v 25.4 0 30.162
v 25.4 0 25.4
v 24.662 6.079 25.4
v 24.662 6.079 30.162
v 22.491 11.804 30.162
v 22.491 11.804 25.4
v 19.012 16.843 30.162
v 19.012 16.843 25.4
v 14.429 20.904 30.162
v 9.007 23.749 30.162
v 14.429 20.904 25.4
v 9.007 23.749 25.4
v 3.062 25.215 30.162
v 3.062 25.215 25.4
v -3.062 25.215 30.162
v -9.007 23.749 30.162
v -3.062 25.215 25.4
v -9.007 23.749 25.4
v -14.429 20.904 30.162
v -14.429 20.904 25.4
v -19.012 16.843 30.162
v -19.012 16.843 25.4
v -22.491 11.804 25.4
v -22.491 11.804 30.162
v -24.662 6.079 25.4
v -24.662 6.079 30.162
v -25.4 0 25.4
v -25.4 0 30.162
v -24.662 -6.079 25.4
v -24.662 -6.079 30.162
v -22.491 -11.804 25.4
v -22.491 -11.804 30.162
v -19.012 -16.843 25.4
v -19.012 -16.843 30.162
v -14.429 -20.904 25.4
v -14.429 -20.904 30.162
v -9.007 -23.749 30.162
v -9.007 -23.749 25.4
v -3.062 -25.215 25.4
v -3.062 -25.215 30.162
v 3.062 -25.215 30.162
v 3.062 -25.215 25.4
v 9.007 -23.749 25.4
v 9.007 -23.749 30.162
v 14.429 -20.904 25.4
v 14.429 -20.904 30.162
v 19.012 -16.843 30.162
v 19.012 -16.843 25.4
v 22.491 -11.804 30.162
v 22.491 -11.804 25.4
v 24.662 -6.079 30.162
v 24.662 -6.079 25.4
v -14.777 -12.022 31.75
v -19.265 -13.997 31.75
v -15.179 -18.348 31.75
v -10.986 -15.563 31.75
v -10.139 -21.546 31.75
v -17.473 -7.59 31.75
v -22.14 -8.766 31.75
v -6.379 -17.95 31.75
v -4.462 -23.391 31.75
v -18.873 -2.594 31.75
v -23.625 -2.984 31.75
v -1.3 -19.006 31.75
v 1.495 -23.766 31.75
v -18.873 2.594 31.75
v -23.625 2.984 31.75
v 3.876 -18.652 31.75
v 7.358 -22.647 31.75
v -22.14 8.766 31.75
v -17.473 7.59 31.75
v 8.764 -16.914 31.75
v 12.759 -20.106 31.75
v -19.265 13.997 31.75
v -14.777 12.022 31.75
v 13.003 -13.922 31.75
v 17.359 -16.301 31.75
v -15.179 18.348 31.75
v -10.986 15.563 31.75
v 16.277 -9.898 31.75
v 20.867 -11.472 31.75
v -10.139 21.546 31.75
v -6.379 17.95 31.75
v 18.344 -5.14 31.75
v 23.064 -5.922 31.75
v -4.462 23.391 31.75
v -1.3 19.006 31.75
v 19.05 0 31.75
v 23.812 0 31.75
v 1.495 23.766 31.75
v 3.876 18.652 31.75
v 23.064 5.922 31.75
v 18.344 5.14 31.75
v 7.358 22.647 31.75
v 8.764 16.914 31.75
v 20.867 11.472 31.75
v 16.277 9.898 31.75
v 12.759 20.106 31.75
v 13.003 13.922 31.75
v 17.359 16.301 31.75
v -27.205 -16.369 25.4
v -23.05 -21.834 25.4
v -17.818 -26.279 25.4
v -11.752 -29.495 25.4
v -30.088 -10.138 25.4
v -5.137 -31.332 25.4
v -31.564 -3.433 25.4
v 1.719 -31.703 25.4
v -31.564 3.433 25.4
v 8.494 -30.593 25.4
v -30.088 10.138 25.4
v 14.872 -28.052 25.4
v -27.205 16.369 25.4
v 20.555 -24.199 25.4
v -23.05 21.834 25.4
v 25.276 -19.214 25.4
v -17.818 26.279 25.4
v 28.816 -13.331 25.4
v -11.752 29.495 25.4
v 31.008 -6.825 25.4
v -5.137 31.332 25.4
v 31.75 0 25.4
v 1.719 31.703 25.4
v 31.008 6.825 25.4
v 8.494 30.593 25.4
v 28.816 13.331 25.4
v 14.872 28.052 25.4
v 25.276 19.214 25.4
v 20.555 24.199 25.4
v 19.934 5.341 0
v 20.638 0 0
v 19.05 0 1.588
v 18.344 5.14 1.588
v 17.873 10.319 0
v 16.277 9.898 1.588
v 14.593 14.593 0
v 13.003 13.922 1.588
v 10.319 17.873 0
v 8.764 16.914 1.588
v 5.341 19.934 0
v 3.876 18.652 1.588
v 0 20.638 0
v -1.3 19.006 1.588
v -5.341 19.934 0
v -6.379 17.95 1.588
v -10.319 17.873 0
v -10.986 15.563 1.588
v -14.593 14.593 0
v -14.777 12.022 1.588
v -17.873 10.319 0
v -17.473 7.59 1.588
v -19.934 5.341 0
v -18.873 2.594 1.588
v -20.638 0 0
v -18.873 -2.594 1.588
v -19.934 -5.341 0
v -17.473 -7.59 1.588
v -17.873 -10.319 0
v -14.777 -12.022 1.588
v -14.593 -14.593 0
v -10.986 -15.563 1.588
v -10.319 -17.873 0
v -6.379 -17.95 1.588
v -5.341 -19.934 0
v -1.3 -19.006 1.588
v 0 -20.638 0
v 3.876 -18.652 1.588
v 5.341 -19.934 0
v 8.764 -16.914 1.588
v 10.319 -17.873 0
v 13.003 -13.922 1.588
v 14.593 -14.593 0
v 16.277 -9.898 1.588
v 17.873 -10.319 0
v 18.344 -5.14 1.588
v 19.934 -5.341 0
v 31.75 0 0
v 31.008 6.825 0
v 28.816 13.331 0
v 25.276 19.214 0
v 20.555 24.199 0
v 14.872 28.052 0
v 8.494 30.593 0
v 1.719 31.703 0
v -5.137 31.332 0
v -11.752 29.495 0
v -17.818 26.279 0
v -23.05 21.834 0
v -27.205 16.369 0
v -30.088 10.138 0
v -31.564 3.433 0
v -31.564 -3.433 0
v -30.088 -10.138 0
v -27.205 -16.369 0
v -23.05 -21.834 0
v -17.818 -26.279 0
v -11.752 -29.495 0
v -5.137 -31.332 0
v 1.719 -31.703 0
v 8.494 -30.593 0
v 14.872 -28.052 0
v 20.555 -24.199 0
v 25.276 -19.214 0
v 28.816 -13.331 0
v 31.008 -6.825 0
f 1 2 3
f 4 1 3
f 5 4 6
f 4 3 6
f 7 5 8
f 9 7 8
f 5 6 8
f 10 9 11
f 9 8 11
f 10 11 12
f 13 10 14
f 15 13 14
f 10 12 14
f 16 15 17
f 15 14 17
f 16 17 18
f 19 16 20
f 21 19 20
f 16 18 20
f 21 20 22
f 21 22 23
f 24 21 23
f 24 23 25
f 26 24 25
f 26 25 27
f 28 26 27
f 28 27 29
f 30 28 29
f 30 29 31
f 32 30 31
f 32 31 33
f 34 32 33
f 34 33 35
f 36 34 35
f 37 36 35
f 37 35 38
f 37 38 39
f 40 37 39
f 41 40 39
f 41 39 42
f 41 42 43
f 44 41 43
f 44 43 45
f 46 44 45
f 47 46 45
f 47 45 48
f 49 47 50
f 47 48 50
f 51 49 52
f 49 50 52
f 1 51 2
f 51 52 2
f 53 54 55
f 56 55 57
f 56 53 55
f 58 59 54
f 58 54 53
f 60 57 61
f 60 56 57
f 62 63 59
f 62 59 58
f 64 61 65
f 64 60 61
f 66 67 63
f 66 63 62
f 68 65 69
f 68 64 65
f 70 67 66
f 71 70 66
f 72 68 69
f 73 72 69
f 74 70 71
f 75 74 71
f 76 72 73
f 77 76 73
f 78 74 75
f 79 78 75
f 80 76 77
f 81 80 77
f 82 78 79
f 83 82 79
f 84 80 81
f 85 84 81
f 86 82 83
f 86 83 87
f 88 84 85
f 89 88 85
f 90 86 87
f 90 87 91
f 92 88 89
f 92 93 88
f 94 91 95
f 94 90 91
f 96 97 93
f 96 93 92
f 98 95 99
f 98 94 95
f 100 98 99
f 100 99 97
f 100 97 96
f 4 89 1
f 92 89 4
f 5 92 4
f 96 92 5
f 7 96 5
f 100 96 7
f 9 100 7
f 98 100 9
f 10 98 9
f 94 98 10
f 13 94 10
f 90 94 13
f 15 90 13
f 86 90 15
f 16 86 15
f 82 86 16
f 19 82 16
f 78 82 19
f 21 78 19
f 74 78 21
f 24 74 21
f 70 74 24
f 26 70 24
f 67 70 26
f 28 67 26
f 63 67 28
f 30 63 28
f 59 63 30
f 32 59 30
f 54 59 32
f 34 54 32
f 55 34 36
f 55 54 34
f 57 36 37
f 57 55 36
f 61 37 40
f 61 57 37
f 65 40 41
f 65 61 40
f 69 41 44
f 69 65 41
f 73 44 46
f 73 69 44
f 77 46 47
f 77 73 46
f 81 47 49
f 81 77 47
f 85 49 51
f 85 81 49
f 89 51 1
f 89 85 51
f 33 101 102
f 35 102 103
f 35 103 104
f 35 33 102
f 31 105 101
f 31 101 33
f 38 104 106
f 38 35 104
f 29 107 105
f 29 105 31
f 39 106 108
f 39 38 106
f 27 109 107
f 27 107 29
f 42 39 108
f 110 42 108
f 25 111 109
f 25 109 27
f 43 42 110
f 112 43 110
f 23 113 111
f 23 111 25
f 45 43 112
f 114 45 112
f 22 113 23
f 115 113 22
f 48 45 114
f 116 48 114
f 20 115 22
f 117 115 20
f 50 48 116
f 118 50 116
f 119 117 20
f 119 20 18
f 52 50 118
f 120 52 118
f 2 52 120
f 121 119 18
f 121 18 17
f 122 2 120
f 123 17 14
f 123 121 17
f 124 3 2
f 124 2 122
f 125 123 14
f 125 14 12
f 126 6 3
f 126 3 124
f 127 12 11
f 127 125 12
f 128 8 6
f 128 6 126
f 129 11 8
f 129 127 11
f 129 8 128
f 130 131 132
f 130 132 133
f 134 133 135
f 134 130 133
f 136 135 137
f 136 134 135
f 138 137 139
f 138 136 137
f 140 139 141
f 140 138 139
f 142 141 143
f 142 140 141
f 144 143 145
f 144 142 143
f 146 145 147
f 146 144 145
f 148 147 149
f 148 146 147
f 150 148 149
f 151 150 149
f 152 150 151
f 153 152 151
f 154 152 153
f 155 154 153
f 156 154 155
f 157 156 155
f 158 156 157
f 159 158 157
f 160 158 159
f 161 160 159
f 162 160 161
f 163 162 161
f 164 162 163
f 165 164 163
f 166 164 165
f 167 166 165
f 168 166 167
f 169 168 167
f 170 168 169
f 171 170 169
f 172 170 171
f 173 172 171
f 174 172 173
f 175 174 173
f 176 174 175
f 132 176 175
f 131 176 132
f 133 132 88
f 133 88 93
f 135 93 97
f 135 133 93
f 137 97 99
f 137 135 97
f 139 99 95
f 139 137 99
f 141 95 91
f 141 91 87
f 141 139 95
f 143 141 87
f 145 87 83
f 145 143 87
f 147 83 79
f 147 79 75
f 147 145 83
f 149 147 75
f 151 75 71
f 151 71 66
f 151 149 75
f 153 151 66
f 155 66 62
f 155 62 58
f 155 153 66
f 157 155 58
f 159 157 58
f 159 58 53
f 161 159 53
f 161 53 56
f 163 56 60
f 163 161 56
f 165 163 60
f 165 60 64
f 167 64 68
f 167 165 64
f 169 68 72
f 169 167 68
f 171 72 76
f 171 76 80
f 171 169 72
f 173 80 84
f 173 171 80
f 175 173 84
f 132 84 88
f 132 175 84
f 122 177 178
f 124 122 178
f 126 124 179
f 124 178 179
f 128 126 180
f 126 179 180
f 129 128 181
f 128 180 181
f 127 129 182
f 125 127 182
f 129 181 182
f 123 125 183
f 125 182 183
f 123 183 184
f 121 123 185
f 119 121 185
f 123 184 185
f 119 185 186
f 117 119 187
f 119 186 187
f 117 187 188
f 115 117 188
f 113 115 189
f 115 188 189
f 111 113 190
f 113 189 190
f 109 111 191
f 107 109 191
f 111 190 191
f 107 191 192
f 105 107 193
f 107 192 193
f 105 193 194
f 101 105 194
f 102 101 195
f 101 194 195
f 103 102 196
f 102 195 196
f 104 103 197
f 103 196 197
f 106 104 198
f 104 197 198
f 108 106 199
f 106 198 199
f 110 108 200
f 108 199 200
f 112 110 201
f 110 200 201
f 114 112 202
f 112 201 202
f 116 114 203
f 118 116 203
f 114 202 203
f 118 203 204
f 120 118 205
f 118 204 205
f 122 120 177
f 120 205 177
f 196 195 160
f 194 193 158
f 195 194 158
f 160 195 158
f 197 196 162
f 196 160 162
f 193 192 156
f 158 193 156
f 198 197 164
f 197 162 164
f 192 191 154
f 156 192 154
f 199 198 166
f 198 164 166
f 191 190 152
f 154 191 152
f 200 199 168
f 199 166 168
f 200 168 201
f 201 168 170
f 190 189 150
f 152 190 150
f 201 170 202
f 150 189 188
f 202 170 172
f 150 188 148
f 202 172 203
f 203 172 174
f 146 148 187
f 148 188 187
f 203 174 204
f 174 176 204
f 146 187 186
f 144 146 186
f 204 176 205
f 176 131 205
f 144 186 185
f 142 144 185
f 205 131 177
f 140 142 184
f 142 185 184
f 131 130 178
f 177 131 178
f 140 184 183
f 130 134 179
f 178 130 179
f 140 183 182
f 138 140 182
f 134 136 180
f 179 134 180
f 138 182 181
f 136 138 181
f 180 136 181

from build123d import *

# Parameters (mm, degrees)
SKETCH1_R           = 31.75
SKETCH1_R_2         = 25.4
BOSS_EXTRUDE3_DEPTH = 25.4
SKETCH1_3_R         = 25.4
SKETCH1_3_R_2       = 19.05
BOSS_EXTRUDE4_DEPTH = 31.75
CHAMFER1_SIZE       = 1.5875


with BuildPart() as part:
    # Sketch1 → Boss-Extrude3 (new body)
    with BuildSketch(Plane.XY):
        Circle(SKETCH1_R)
        Circle(SKETCH1_R_2, mode=Mode.SUBTRACT)
    extrude(amount=BOSS_EXTRUDE3_DEPTH)

    # Sketch1<3> → Boss-Extrude4 (add)
    with BuildSketch(Plane.XY):
        Circle(SKETCH1_3_R)
        Circle(SKETCH1_3_R_2, mode=Mode.SUBTRACT)
    extrude(amount=BOSS_EXTRUDE4_DEPTH)

    # Chamfer1
    chamfer1_edges = [part.edges().sort_by_distance(p)[0] for p in [
        (-25.4, 0, 31.75),
        (-19.05, 0, 0),
    ]]
    chamfer(chamfer1_edges, length=CHAMFER1_SIZE)


solid = part.part
